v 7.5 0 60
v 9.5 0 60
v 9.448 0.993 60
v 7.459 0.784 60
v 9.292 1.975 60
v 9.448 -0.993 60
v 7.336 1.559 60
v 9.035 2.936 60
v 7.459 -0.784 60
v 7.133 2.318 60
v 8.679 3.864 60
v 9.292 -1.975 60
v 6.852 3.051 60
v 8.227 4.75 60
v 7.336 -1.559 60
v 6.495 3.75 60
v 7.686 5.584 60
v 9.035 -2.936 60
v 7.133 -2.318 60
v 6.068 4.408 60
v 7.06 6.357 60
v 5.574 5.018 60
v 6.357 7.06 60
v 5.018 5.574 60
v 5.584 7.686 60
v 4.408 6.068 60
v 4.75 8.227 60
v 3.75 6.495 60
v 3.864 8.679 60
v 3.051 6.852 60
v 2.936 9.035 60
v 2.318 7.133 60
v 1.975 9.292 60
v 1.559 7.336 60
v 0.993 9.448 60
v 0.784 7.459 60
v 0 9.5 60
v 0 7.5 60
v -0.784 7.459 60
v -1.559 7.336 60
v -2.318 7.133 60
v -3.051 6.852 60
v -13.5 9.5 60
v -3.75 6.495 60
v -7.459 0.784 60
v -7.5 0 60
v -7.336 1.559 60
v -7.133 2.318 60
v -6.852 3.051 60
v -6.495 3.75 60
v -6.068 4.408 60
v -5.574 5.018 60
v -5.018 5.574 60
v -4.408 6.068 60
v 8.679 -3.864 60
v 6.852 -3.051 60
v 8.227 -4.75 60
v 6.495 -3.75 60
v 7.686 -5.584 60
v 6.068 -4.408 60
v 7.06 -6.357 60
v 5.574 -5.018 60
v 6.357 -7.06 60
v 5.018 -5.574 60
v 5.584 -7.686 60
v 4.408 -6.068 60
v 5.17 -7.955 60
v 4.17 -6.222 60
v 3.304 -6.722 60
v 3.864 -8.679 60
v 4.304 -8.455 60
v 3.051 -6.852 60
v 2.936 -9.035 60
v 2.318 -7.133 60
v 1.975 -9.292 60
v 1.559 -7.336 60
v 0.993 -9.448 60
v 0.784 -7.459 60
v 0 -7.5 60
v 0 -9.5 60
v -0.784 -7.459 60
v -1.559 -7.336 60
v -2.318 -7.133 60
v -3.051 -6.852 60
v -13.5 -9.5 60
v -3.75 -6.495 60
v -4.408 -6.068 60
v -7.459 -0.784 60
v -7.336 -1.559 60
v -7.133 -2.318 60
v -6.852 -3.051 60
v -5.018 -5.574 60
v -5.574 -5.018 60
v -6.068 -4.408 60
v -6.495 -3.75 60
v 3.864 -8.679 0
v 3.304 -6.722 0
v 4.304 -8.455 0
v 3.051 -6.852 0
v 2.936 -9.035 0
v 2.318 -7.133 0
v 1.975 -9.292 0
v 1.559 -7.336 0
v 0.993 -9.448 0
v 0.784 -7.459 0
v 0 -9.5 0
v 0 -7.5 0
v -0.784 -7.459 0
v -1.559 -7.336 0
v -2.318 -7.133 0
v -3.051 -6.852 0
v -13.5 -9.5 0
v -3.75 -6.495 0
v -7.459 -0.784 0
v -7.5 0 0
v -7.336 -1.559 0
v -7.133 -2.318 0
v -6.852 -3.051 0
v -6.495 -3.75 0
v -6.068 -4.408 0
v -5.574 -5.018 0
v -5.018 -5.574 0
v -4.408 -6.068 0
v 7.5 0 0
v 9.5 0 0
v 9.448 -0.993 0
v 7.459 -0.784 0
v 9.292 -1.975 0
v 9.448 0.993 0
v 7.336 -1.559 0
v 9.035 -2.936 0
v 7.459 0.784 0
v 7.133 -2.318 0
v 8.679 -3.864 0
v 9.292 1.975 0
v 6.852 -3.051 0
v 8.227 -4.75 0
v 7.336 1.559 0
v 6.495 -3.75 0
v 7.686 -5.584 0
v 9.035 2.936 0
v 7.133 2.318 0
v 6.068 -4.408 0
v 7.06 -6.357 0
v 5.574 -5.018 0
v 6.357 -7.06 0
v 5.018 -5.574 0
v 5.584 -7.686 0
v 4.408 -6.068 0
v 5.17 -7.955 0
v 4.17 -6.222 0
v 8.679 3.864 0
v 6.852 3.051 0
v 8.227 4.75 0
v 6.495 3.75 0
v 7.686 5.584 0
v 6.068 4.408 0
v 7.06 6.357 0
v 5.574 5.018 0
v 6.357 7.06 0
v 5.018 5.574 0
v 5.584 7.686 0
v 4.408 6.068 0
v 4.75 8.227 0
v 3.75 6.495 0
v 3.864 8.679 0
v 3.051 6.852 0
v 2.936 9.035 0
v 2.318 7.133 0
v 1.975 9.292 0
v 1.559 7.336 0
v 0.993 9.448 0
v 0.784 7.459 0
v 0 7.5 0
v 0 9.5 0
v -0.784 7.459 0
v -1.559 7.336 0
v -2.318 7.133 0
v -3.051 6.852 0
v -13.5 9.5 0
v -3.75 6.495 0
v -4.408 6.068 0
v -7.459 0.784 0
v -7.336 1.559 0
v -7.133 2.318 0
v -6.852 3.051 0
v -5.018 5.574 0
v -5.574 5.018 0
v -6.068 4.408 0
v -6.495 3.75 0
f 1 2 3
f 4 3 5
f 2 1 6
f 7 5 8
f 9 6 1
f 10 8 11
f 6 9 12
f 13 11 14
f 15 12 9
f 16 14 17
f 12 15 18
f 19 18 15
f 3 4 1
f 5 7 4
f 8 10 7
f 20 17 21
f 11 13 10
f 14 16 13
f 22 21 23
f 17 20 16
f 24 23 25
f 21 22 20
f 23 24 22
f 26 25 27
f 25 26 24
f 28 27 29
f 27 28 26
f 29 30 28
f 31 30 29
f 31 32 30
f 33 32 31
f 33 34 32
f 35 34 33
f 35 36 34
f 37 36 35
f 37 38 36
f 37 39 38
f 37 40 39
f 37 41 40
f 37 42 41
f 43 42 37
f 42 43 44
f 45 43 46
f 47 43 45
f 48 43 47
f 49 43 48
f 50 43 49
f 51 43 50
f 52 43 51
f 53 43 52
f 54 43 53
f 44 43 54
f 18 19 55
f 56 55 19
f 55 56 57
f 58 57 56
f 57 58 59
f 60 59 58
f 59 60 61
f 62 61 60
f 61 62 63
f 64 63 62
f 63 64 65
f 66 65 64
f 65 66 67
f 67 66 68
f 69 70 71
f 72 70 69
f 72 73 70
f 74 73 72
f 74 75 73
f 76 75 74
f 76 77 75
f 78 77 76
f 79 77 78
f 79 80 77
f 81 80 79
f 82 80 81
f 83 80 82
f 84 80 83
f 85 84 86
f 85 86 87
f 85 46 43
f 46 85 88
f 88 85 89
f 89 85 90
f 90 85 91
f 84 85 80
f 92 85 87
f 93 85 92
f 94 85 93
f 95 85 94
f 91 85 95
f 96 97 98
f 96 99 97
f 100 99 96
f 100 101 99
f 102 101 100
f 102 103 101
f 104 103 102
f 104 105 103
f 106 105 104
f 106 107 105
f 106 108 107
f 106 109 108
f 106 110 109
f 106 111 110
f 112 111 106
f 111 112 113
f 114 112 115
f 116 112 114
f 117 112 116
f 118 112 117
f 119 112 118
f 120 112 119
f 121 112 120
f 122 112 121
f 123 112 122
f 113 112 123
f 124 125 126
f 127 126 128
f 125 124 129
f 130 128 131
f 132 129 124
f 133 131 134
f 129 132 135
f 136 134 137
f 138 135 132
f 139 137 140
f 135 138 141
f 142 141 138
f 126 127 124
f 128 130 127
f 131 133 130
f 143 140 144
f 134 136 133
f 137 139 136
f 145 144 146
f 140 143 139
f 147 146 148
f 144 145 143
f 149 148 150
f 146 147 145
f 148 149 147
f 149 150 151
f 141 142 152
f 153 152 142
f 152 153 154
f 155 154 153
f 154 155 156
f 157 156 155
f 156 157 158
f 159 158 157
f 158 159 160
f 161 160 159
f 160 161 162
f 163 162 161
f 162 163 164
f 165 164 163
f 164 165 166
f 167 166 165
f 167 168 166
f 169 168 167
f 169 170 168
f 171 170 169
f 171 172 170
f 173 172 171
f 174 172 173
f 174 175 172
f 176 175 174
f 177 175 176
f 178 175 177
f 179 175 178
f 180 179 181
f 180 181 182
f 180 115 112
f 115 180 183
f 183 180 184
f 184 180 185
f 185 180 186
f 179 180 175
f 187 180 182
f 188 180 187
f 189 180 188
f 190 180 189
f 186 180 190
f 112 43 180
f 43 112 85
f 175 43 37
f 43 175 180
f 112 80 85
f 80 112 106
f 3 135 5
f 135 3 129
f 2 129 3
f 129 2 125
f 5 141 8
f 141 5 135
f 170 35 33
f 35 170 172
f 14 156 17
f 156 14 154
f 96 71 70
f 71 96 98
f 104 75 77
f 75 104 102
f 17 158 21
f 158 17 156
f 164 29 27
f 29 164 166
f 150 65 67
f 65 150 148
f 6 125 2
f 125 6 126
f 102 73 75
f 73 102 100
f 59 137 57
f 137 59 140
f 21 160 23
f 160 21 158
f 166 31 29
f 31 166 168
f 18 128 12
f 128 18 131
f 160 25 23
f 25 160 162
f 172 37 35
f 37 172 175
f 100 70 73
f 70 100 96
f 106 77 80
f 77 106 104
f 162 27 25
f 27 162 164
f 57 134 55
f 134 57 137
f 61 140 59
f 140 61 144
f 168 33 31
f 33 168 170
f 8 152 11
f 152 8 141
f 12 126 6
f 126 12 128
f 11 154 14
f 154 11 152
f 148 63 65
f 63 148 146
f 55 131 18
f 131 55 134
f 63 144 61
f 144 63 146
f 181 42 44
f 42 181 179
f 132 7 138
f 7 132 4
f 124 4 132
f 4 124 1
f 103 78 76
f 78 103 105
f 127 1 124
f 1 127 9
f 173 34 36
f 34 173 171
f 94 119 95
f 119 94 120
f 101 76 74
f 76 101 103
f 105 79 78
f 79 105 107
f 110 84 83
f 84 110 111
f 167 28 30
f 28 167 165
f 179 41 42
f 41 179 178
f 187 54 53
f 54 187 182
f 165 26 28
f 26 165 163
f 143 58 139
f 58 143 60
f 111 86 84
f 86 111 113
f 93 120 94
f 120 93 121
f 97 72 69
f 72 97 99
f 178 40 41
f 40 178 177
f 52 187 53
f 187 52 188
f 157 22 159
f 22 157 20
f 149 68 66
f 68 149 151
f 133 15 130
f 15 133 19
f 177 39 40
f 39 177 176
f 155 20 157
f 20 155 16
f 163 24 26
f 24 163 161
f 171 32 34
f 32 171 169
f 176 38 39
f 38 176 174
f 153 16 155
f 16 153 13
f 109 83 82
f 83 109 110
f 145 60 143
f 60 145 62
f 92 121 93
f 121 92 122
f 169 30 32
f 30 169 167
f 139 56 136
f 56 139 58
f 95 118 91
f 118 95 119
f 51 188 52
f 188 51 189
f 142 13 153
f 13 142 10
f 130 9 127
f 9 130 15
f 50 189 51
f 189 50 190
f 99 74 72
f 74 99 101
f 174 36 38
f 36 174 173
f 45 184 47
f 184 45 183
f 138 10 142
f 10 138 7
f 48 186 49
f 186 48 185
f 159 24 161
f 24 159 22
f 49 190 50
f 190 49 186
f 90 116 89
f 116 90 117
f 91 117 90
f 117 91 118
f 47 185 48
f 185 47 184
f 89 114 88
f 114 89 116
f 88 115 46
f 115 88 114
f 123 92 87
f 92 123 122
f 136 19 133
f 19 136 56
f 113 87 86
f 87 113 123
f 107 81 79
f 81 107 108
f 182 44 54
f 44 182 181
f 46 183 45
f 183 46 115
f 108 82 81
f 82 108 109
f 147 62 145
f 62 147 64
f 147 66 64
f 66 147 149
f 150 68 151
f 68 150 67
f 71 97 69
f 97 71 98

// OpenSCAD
// PRUSA iteration3
// Bearing holders
// GNU GPL v3
// Josef Průša <iam@josefprusa.cz> and contributors
// http://www.reprap.org/wiki/Prusa_Mendel
// http://prusamendel.org

//LM8UU
bearing_diameter = 15;
bearing_long = 24;
bearing_in = 8;

module horizontal_bearing_base(bearings=1){
 translate(v=[0,0,6]) cube(size = [24,8+bearings*bearing_long,12], center = true);	
}
module horizontal_bearing_holes(bearings=1){
 cutter_lenght = 10+bearings*bearing_long;
 one_holder_lenght = 8+bearing_long;
 holder_lenght = 8+bearings*bearing_long;
 
 // Main bearing cut
 difference(){
  translate(v=[0,0,12]) rotate(a=[90,0,0]) translate(v=[0,0,-cutter_lenght/2]) cylinder(h = cutter_lenght, r=bearing_diameter/2, $fn=50);
  // Bearing retainers
  translate(v=[0,1-holder_lenght/2,3]) cube(size = [24,6,2+(bearing_diameter-bearing_in)/2], center = true);
  translate(v=[0,-1+holder_lenght/2,3]) cube(size = [24,6,2+(bearing_diameter-bearing_in)/2], center = true);
 }
 
 // Ziptie cutouts
 ziptie_cut_ofset = 0;
 for ( i = [0 : bearings-1] ){
  // For easier positioning I move them by half of one 
  // bearing holder then add each bearign lenght and then center again
  translate(v=[0,-holder_lenght/2,0]) translate(v=[0,one_holder_lenght/2+i*25,0]) difference(){
   union(){
    translate(v=[0,2-6,12]) rotate(a=[90,0,0]) translate(v=[0,0,0]) cylinder(h = 4, r=12.5, $fn=50);
    translate(v=[0,2+6,12]) rotate(a=[90,0,0]) translate(v=[0,0,0]) cylinder(h = 4, r=12.5, $fn=50);
   }
   translate(v=[0,10,12]) rotate(a=[90,0,0]) translate(v=[0,0,0]) cylinder(h = 24, r=10, $fn=50);
  }
 }
 
}

module horizontal_bearing_test(){
 difference(){
  horizontal_bearing_base(1);
  horizontal_bearing_holes(1);
 }
 translate(v=[30,0,0]) difference(){
  horizontal_bearing_base(2);
  horizontal_bearing_holes(2);
 }
 translate(v=[60,0,0]) difference(){
  horizontal_bearing_base(3);
  horizontal_bearing_holes(3);
 }
}



thinwall = 2;
bearing_size = bearing_diameter + 2 * thinwall;

module vertical_bearing_base(){
 translate(v=[-2-bearing_size/4,0,30]) cube(size = [4+bearing_size/2,bearing_size,60], center = true);
 cylinder(h = 60, r=bearing_size/2, $fn = 60);
}

module vertical_bearing_holes(){
  translate(v=[0,0,-1]) cylinder(h = 62, r=bearing_diameter/2, $fn = 60);
  rotate(a=[0,0,-60]) translate(v=[10,0,31]) cube(size = [10,1,62], center = true);
}

difference(){
vertical_bearing_base();
vertical_bearing_holes();
}
